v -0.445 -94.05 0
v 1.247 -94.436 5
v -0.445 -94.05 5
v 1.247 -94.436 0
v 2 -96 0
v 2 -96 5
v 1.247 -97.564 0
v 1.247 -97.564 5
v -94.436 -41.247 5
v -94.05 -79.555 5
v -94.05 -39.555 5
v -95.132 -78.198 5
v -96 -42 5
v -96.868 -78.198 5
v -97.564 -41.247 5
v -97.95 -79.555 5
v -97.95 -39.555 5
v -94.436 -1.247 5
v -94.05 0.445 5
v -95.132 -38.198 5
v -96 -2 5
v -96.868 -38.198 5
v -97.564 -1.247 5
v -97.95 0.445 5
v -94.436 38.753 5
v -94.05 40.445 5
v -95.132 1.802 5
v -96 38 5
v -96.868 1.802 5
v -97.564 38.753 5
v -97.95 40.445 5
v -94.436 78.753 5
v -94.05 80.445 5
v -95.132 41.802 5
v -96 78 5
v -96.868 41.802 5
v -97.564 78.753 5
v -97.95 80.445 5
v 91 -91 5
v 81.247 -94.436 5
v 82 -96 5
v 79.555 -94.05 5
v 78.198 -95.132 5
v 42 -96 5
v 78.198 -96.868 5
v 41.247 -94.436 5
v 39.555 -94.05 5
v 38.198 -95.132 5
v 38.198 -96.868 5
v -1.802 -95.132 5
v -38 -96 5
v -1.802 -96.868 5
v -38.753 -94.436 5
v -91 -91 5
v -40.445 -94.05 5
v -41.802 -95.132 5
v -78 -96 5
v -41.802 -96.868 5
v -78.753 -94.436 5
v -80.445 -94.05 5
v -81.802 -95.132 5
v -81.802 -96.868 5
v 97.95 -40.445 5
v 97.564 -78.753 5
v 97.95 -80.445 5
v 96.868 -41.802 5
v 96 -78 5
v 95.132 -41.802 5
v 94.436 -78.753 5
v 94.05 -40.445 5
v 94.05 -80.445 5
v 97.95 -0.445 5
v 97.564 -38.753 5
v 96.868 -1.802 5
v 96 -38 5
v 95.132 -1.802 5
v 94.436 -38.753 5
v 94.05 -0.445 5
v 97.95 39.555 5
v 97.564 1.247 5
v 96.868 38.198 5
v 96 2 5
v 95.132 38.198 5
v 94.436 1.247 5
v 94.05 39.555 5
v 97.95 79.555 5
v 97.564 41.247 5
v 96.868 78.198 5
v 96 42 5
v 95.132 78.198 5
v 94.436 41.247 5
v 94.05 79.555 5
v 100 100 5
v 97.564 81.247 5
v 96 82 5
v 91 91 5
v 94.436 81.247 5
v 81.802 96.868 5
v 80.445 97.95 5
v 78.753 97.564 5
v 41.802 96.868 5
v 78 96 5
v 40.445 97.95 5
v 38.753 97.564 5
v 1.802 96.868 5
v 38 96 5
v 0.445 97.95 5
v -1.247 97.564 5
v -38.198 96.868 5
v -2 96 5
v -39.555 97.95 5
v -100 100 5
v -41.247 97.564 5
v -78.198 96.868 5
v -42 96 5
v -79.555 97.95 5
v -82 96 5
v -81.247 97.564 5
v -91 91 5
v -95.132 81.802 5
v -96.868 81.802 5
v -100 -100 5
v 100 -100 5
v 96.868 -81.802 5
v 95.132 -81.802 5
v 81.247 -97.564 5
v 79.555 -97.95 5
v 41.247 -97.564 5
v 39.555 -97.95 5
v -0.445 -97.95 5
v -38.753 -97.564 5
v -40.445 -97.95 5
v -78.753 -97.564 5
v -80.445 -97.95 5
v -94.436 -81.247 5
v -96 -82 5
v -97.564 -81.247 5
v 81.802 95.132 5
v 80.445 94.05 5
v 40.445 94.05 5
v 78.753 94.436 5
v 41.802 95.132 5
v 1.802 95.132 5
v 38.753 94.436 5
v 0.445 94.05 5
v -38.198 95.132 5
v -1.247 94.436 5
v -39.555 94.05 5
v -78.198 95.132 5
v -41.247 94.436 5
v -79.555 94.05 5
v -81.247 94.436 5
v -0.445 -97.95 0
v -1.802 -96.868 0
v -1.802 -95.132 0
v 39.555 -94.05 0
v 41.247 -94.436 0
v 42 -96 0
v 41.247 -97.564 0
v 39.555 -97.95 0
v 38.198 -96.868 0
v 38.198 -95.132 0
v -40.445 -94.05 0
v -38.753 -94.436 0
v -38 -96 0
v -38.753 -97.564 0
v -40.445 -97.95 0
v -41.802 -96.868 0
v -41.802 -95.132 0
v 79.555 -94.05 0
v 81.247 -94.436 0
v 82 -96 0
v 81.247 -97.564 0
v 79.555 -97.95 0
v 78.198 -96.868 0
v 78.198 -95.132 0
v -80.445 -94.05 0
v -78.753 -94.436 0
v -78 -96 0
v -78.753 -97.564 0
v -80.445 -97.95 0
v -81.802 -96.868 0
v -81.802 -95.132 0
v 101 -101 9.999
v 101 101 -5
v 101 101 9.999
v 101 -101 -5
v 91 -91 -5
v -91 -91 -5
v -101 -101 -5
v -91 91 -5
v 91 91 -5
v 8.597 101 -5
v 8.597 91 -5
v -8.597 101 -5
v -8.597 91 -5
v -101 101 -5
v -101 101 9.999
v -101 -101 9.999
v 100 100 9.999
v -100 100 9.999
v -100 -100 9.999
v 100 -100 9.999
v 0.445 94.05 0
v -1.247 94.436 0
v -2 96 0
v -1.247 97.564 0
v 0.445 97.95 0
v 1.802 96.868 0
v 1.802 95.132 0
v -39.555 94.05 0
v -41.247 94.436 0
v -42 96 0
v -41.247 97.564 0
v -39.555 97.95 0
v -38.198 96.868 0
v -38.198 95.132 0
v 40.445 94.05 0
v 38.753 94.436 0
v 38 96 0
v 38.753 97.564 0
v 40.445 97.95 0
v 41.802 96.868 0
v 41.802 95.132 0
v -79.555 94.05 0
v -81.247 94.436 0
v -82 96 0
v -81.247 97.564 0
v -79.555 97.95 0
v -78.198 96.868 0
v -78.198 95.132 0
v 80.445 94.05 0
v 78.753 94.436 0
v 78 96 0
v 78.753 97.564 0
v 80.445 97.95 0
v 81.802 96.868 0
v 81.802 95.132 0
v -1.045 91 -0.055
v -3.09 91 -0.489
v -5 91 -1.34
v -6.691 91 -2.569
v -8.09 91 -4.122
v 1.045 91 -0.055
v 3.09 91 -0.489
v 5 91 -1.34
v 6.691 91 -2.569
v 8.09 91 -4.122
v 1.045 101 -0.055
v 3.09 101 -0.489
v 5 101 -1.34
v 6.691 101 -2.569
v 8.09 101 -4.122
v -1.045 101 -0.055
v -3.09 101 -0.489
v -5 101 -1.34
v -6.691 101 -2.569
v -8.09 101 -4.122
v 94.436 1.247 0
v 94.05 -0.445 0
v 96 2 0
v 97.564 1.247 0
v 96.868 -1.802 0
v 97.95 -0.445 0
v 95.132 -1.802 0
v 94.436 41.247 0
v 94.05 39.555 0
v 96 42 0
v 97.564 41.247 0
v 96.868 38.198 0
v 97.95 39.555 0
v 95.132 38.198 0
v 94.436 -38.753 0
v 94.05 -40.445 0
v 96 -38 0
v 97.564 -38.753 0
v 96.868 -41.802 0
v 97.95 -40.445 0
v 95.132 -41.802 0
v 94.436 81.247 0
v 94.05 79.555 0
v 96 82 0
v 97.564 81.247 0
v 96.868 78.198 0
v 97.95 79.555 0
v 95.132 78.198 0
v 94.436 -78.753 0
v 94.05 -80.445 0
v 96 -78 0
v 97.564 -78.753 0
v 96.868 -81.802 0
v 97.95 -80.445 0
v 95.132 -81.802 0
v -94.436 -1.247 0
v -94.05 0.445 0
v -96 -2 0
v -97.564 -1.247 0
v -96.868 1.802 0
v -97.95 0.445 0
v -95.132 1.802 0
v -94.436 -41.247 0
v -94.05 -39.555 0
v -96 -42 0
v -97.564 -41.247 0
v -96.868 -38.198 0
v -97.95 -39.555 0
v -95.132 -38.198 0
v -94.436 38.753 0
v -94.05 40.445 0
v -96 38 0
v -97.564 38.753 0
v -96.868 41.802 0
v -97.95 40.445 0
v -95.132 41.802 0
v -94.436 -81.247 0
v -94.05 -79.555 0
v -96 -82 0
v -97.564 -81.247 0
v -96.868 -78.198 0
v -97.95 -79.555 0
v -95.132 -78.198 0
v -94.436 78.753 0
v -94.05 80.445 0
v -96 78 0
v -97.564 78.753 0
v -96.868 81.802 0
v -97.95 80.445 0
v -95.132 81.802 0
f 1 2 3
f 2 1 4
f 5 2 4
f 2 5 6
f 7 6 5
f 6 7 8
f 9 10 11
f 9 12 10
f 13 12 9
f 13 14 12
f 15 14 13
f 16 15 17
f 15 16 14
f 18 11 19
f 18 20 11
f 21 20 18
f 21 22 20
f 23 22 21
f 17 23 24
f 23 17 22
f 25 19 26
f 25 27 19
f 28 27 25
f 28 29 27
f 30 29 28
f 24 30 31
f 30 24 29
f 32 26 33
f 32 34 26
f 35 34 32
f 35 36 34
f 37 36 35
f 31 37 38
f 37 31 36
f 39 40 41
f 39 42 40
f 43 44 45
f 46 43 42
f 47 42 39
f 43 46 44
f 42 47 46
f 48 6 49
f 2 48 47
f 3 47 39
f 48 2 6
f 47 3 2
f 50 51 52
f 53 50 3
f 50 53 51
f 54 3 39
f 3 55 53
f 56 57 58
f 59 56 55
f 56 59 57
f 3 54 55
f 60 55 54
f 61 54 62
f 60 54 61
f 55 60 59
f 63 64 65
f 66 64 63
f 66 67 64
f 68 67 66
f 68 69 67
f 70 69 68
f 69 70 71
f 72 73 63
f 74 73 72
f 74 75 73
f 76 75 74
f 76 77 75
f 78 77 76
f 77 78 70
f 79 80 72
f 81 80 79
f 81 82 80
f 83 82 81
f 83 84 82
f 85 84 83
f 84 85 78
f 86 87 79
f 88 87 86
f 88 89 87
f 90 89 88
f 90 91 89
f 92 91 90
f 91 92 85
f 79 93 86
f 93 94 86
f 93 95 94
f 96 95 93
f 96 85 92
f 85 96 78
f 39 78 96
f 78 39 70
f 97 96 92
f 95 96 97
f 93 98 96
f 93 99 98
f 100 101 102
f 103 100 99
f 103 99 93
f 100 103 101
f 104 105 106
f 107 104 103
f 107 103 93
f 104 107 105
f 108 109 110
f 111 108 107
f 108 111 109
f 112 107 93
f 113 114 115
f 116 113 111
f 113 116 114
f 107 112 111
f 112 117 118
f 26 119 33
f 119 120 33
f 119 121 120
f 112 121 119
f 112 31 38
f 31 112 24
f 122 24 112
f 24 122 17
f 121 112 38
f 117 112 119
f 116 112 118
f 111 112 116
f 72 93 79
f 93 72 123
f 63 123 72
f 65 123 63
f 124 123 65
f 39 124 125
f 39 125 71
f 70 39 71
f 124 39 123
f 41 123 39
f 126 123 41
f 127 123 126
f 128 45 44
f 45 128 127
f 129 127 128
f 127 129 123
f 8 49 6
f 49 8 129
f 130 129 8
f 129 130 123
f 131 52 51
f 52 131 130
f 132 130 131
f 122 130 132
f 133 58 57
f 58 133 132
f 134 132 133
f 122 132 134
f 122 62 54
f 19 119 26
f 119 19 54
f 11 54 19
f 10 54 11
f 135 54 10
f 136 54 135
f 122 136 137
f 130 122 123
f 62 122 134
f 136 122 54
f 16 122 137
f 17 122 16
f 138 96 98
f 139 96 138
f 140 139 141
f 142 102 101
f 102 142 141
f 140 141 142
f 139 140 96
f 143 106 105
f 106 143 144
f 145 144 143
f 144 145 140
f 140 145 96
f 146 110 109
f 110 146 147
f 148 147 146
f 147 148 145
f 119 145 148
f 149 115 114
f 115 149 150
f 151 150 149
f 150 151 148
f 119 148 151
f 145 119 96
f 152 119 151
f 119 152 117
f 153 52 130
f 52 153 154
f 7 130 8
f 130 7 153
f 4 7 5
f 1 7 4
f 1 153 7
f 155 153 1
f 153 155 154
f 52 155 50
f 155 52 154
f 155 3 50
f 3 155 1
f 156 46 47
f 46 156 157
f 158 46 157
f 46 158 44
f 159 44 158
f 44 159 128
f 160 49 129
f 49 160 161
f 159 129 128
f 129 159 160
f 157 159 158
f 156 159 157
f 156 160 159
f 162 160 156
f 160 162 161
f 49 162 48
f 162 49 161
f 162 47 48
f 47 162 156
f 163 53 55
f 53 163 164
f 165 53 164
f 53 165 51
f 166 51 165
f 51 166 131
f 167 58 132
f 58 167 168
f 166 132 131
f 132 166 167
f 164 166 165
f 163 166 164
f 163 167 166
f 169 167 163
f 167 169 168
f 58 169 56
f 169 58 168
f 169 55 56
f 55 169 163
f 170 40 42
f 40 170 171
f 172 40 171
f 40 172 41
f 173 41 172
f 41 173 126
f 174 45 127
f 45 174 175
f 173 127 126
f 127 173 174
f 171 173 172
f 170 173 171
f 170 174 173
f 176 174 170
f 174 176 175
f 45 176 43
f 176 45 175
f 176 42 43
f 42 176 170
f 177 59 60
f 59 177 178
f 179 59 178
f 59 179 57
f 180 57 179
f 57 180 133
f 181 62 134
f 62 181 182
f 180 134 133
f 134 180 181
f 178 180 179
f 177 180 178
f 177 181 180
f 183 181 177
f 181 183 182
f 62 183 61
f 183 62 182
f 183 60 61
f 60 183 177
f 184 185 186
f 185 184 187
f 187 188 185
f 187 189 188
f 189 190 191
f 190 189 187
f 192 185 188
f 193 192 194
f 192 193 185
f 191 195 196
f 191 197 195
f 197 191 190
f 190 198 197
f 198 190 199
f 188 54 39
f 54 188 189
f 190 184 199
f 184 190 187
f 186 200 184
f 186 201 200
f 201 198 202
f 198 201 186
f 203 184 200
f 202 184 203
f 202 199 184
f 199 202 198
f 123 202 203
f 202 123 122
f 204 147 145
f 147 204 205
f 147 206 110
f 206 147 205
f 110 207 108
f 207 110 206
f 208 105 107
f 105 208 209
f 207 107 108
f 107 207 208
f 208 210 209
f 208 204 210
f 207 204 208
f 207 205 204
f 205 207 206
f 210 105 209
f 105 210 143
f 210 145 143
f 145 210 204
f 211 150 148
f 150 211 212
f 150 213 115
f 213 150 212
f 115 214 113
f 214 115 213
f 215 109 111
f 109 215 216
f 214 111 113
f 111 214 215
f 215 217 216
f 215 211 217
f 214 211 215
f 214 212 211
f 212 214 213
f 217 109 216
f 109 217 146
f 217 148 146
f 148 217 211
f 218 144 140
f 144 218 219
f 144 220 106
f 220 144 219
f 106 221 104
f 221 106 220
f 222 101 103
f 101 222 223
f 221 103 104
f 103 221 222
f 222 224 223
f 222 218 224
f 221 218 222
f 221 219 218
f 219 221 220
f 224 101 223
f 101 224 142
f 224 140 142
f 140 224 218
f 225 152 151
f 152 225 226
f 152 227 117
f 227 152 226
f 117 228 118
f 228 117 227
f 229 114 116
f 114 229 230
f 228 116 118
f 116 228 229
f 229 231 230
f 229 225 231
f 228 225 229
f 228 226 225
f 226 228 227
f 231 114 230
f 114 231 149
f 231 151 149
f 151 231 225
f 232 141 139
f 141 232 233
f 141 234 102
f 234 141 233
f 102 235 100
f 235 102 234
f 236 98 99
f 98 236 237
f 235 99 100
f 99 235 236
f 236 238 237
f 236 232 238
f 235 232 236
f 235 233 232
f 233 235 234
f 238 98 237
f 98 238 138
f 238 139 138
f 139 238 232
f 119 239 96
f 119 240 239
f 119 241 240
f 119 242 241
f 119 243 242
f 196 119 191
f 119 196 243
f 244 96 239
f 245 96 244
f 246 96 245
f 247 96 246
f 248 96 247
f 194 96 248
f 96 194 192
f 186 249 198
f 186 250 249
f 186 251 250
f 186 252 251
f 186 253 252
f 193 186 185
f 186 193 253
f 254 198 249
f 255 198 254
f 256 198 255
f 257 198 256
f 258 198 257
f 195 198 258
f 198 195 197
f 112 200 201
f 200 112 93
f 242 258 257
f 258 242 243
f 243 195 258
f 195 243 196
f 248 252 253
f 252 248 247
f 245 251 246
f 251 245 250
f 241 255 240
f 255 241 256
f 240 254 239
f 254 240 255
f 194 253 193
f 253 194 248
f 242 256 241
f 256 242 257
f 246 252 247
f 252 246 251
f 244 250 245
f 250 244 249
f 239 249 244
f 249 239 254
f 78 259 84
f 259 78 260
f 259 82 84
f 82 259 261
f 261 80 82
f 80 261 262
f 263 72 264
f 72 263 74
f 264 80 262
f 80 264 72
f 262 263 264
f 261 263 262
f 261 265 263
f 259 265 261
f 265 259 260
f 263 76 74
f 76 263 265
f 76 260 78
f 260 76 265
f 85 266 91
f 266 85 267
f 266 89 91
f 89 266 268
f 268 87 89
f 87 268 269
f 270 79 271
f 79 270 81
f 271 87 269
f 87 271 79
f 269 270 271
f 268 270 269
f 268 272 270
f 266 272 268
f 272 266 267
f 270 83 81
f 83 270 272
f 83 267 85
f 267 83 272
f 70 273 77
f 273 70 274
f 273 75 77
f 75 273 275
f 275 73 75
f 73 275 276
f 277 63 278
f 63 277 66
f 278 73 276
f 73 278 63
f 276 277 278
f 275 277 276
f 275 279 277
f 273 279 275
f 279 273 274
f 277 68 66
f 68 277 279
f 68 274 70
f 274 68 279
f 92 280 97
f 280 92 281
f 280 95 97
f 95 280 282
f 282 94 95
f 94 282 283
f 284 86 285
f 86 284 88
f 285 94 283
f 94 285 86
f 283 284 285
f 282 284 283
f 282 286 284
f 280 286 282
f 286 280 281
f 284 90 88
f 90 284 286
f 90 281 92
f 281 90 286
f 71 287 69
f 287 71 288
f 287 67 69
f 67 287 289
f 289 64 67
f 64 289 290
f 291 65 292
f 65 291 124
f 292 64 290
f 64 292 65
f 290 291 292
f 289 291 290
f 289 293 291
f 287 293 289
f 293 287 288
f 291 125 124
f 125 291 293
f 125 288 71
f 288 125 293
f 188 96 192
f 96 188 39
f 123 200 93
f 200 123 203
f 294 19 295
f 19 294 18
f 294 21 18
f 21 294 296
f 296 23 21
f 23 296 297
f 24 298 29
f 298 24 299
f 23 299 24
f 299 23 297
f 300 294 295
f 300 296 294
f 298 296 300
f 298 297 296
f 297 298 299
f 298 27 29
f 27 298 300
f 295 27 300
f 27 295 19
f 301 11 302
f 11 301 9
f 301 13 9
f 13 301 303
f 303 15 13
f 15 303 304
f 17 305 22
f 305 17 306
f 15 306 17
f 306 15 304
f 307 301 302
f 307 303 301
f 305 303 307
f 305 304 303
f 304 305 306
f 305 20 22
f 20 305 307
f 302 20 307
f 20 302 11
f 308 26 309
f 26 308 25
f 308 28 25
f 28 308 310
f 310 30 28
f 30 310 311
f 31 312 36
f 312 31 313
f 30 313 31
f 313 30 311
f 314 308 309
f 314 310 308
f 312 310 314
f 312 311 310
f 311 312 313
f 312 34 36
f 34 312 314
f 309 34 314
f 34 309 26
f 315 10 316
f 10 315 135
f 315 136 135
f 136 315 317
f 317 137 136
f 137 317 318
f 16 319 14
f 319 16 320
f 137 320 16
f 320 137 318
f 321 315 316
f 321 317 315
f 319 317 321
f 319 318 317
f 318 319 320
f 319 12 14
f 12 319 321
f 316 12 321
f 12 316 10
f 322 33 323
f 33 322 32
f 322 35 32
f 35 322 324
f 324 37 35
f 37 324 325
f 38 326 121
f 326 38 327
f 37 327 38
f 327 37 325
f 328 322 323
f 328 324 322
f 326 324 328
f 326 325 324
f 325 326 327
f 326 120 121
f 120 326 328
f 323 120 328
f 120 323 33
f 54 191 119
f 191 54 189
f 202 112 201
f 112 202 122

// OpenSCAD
// file: base.scad
// base_plate_elevation: Height at which the diorama should be placed in cm
// base_plate_support: Length of base plate bracket minus thickness of covers in cm
// base_plate_length: Side length of the base plate in cm
// base_plate_height: Height of base plate in cm
// cover_thickness: Thickness of cover material
// drillings: Boolean to include or exclude drillings
// drilling_radius: Radius of the drillings in cm

// Maybe offset of cover_thickness is needed to have correct length inside (e.g. base_plate_length needs to be 102 and not 100 to fit 100 length diorama)!!!

// Main base module with optional drillings
module base(base_plate_elevation, base_plate_support, base_plate_length, base_plate_height, cover_thickness, drillings, drilling_radius) {
    // Support structure
    difference() {
        cube(size=[base_plate_length, base_plate_support, base_plate_elevation], center=true);
        if (drillings) {
            if (base_plate_length >= 100) {
                for (i=[0:40:base_plate_length/2]) {
                    translate([i, 0, base_plate_elevation/4]) {
                        cylinder(r=drilling_radius, h=base_plate_elevation/2, center=true);
                    }
                    translate([-i, 0, base_plate_elevation/4]) {
                        cylinder(r=drilling_radius, h=base_plate_elevation/2, center=true);
                    }
                }
            } else {
                translate([0, 0, base_plate_elevation/4]) {
                    cylinder(r=drilling_radius, h=base_plate_elevation/2, center=true);
                }
            }
        }
    }
    
    // Base plate cover
    translate([0, -(base_plate_support/2 - cover_thickness/2), base_plate_elevation/2 + base_plate_height/2 - 0.001]) {
        cube(size=[base_plate_length, cover_thickness, base_plate_height], center=true);
    }
}

// Adds a female connector on the right side for interconnecting inidividual sections
module female_connector(base_plate_length, base_plate_support) {
    translate([base_plate_length/2, base_plate_support/2 - base_plate_support/2, 0]) {
        rotate([0, 0, 90]) {
            cube(size=[5, 10, 5], center=true);
        }
    }
}

// Adds a male connector on the left side for interconnecting inidividual sections
module male_connector(base_plate_length, base_plate_support) {
    translate([-(base_plate_length/2), base_plate_support/2 - base_plate_support/2, 0]) {
        rotate([0, 0, 90]) {
            cube(size=[5, 10, 5], center=true);
        }
    }
}

// Adds a right corner connector for 90° connections
module right_corner_connector(base_plate_length, base_plate_support) {
    translate([base_plate_length/2 - 5, base_plate_support/2, 0]) {
        cube(size=[5, 10, 5], center=true);
    }
}

// Adds a left corner connector for 90° connections
module left_corner_connector(base_plate_length, base_plate_support) {
    translate([-(base_plate_length/2 - 5), base_plate_support/2, 0]) {
        cube(size=[5, 10, 5], center=true);
    }
}

// Adds a right side cover for corner sections
module right_side_cover(base_plate_length, base_plate_elevation, base_plate_support, base_plate_height, cover_thickness) {
    translate([base_plate_length/2 - cover_thickness/2, 0, base_plate_elevation/2 + base_plate_height/2 - 0.001]) {
        rotate([0, 0, 90]) {
            cube(size=[base_plate_support, cover_thickness, base_plate_height], center=true);
        }
    }
}

// Adds a left side cover for corner sections
module left_side_cover(base_plate_length, base_plate_elevation, base_plate_support, base_plate_height, cover_thickness) {
    translate([-(base_plate_length/2 - cover_thickness/2), 0, base_plate_elevation/2 + base_plate_height/2 - 0.001]) {
        rotate([0, 0, 90]) {
            cube(size=[base_plate_support, cover_thickness, base_plate_height], center=true);
        }
    }
}
// main file
use <base.scad>;

base_plate_elevation=10;    // Height at which the diorama should be placed in cm
base_plate_support=10;      // Depth of base plate bracket minus thickness of covers in cm
base_plate_length=202;      // Side length of the base plate (section) in cm

base_plate_height=5;        // Thichkness of base plate in cm
cover_thickness=1;          // Thickness of base cover

drillings=true;             // Drillings to mount the base plate
drilling_radius=2;          // Radius of the drillings in cm


translate([0, -96, 0]) {
    base(base_plate_elevation, base_plate_support, base_plate_length, base_plate_height, cover_thickness, drillings, drilling_radius);
}

rotate([0, 0, 180]) {
    difference() {
        translate([0, -96, 0]) {
            base(base_plate_elevation, base_plate_support, base_plate_length, base_plate_height, cover_thickness, drillings, drilling_radius);
        }
        rotate([90, 0, 0]) {
            translate([0, -10, 96]) {
                cylinder(r=10, h=10, center=true);
            }
        }
    }
    
}


color("red")
rotate([0, 0, 90]) {
    translate([0, -96, 0]) {
        base(base_plate_elevation, base_plate_support, base_plate_length, base_plate_height, cover_thickness, drillings, drilling_radius);
    }
}

color("red")
rotate([0, 0, -90]) {
    translate([0, -96, 0]) {
        base(base_plate_elevation, base_plate_support, base_plate_length, base_plate_height, cover_thickness, drillings, drilling_radius);
    }
}
